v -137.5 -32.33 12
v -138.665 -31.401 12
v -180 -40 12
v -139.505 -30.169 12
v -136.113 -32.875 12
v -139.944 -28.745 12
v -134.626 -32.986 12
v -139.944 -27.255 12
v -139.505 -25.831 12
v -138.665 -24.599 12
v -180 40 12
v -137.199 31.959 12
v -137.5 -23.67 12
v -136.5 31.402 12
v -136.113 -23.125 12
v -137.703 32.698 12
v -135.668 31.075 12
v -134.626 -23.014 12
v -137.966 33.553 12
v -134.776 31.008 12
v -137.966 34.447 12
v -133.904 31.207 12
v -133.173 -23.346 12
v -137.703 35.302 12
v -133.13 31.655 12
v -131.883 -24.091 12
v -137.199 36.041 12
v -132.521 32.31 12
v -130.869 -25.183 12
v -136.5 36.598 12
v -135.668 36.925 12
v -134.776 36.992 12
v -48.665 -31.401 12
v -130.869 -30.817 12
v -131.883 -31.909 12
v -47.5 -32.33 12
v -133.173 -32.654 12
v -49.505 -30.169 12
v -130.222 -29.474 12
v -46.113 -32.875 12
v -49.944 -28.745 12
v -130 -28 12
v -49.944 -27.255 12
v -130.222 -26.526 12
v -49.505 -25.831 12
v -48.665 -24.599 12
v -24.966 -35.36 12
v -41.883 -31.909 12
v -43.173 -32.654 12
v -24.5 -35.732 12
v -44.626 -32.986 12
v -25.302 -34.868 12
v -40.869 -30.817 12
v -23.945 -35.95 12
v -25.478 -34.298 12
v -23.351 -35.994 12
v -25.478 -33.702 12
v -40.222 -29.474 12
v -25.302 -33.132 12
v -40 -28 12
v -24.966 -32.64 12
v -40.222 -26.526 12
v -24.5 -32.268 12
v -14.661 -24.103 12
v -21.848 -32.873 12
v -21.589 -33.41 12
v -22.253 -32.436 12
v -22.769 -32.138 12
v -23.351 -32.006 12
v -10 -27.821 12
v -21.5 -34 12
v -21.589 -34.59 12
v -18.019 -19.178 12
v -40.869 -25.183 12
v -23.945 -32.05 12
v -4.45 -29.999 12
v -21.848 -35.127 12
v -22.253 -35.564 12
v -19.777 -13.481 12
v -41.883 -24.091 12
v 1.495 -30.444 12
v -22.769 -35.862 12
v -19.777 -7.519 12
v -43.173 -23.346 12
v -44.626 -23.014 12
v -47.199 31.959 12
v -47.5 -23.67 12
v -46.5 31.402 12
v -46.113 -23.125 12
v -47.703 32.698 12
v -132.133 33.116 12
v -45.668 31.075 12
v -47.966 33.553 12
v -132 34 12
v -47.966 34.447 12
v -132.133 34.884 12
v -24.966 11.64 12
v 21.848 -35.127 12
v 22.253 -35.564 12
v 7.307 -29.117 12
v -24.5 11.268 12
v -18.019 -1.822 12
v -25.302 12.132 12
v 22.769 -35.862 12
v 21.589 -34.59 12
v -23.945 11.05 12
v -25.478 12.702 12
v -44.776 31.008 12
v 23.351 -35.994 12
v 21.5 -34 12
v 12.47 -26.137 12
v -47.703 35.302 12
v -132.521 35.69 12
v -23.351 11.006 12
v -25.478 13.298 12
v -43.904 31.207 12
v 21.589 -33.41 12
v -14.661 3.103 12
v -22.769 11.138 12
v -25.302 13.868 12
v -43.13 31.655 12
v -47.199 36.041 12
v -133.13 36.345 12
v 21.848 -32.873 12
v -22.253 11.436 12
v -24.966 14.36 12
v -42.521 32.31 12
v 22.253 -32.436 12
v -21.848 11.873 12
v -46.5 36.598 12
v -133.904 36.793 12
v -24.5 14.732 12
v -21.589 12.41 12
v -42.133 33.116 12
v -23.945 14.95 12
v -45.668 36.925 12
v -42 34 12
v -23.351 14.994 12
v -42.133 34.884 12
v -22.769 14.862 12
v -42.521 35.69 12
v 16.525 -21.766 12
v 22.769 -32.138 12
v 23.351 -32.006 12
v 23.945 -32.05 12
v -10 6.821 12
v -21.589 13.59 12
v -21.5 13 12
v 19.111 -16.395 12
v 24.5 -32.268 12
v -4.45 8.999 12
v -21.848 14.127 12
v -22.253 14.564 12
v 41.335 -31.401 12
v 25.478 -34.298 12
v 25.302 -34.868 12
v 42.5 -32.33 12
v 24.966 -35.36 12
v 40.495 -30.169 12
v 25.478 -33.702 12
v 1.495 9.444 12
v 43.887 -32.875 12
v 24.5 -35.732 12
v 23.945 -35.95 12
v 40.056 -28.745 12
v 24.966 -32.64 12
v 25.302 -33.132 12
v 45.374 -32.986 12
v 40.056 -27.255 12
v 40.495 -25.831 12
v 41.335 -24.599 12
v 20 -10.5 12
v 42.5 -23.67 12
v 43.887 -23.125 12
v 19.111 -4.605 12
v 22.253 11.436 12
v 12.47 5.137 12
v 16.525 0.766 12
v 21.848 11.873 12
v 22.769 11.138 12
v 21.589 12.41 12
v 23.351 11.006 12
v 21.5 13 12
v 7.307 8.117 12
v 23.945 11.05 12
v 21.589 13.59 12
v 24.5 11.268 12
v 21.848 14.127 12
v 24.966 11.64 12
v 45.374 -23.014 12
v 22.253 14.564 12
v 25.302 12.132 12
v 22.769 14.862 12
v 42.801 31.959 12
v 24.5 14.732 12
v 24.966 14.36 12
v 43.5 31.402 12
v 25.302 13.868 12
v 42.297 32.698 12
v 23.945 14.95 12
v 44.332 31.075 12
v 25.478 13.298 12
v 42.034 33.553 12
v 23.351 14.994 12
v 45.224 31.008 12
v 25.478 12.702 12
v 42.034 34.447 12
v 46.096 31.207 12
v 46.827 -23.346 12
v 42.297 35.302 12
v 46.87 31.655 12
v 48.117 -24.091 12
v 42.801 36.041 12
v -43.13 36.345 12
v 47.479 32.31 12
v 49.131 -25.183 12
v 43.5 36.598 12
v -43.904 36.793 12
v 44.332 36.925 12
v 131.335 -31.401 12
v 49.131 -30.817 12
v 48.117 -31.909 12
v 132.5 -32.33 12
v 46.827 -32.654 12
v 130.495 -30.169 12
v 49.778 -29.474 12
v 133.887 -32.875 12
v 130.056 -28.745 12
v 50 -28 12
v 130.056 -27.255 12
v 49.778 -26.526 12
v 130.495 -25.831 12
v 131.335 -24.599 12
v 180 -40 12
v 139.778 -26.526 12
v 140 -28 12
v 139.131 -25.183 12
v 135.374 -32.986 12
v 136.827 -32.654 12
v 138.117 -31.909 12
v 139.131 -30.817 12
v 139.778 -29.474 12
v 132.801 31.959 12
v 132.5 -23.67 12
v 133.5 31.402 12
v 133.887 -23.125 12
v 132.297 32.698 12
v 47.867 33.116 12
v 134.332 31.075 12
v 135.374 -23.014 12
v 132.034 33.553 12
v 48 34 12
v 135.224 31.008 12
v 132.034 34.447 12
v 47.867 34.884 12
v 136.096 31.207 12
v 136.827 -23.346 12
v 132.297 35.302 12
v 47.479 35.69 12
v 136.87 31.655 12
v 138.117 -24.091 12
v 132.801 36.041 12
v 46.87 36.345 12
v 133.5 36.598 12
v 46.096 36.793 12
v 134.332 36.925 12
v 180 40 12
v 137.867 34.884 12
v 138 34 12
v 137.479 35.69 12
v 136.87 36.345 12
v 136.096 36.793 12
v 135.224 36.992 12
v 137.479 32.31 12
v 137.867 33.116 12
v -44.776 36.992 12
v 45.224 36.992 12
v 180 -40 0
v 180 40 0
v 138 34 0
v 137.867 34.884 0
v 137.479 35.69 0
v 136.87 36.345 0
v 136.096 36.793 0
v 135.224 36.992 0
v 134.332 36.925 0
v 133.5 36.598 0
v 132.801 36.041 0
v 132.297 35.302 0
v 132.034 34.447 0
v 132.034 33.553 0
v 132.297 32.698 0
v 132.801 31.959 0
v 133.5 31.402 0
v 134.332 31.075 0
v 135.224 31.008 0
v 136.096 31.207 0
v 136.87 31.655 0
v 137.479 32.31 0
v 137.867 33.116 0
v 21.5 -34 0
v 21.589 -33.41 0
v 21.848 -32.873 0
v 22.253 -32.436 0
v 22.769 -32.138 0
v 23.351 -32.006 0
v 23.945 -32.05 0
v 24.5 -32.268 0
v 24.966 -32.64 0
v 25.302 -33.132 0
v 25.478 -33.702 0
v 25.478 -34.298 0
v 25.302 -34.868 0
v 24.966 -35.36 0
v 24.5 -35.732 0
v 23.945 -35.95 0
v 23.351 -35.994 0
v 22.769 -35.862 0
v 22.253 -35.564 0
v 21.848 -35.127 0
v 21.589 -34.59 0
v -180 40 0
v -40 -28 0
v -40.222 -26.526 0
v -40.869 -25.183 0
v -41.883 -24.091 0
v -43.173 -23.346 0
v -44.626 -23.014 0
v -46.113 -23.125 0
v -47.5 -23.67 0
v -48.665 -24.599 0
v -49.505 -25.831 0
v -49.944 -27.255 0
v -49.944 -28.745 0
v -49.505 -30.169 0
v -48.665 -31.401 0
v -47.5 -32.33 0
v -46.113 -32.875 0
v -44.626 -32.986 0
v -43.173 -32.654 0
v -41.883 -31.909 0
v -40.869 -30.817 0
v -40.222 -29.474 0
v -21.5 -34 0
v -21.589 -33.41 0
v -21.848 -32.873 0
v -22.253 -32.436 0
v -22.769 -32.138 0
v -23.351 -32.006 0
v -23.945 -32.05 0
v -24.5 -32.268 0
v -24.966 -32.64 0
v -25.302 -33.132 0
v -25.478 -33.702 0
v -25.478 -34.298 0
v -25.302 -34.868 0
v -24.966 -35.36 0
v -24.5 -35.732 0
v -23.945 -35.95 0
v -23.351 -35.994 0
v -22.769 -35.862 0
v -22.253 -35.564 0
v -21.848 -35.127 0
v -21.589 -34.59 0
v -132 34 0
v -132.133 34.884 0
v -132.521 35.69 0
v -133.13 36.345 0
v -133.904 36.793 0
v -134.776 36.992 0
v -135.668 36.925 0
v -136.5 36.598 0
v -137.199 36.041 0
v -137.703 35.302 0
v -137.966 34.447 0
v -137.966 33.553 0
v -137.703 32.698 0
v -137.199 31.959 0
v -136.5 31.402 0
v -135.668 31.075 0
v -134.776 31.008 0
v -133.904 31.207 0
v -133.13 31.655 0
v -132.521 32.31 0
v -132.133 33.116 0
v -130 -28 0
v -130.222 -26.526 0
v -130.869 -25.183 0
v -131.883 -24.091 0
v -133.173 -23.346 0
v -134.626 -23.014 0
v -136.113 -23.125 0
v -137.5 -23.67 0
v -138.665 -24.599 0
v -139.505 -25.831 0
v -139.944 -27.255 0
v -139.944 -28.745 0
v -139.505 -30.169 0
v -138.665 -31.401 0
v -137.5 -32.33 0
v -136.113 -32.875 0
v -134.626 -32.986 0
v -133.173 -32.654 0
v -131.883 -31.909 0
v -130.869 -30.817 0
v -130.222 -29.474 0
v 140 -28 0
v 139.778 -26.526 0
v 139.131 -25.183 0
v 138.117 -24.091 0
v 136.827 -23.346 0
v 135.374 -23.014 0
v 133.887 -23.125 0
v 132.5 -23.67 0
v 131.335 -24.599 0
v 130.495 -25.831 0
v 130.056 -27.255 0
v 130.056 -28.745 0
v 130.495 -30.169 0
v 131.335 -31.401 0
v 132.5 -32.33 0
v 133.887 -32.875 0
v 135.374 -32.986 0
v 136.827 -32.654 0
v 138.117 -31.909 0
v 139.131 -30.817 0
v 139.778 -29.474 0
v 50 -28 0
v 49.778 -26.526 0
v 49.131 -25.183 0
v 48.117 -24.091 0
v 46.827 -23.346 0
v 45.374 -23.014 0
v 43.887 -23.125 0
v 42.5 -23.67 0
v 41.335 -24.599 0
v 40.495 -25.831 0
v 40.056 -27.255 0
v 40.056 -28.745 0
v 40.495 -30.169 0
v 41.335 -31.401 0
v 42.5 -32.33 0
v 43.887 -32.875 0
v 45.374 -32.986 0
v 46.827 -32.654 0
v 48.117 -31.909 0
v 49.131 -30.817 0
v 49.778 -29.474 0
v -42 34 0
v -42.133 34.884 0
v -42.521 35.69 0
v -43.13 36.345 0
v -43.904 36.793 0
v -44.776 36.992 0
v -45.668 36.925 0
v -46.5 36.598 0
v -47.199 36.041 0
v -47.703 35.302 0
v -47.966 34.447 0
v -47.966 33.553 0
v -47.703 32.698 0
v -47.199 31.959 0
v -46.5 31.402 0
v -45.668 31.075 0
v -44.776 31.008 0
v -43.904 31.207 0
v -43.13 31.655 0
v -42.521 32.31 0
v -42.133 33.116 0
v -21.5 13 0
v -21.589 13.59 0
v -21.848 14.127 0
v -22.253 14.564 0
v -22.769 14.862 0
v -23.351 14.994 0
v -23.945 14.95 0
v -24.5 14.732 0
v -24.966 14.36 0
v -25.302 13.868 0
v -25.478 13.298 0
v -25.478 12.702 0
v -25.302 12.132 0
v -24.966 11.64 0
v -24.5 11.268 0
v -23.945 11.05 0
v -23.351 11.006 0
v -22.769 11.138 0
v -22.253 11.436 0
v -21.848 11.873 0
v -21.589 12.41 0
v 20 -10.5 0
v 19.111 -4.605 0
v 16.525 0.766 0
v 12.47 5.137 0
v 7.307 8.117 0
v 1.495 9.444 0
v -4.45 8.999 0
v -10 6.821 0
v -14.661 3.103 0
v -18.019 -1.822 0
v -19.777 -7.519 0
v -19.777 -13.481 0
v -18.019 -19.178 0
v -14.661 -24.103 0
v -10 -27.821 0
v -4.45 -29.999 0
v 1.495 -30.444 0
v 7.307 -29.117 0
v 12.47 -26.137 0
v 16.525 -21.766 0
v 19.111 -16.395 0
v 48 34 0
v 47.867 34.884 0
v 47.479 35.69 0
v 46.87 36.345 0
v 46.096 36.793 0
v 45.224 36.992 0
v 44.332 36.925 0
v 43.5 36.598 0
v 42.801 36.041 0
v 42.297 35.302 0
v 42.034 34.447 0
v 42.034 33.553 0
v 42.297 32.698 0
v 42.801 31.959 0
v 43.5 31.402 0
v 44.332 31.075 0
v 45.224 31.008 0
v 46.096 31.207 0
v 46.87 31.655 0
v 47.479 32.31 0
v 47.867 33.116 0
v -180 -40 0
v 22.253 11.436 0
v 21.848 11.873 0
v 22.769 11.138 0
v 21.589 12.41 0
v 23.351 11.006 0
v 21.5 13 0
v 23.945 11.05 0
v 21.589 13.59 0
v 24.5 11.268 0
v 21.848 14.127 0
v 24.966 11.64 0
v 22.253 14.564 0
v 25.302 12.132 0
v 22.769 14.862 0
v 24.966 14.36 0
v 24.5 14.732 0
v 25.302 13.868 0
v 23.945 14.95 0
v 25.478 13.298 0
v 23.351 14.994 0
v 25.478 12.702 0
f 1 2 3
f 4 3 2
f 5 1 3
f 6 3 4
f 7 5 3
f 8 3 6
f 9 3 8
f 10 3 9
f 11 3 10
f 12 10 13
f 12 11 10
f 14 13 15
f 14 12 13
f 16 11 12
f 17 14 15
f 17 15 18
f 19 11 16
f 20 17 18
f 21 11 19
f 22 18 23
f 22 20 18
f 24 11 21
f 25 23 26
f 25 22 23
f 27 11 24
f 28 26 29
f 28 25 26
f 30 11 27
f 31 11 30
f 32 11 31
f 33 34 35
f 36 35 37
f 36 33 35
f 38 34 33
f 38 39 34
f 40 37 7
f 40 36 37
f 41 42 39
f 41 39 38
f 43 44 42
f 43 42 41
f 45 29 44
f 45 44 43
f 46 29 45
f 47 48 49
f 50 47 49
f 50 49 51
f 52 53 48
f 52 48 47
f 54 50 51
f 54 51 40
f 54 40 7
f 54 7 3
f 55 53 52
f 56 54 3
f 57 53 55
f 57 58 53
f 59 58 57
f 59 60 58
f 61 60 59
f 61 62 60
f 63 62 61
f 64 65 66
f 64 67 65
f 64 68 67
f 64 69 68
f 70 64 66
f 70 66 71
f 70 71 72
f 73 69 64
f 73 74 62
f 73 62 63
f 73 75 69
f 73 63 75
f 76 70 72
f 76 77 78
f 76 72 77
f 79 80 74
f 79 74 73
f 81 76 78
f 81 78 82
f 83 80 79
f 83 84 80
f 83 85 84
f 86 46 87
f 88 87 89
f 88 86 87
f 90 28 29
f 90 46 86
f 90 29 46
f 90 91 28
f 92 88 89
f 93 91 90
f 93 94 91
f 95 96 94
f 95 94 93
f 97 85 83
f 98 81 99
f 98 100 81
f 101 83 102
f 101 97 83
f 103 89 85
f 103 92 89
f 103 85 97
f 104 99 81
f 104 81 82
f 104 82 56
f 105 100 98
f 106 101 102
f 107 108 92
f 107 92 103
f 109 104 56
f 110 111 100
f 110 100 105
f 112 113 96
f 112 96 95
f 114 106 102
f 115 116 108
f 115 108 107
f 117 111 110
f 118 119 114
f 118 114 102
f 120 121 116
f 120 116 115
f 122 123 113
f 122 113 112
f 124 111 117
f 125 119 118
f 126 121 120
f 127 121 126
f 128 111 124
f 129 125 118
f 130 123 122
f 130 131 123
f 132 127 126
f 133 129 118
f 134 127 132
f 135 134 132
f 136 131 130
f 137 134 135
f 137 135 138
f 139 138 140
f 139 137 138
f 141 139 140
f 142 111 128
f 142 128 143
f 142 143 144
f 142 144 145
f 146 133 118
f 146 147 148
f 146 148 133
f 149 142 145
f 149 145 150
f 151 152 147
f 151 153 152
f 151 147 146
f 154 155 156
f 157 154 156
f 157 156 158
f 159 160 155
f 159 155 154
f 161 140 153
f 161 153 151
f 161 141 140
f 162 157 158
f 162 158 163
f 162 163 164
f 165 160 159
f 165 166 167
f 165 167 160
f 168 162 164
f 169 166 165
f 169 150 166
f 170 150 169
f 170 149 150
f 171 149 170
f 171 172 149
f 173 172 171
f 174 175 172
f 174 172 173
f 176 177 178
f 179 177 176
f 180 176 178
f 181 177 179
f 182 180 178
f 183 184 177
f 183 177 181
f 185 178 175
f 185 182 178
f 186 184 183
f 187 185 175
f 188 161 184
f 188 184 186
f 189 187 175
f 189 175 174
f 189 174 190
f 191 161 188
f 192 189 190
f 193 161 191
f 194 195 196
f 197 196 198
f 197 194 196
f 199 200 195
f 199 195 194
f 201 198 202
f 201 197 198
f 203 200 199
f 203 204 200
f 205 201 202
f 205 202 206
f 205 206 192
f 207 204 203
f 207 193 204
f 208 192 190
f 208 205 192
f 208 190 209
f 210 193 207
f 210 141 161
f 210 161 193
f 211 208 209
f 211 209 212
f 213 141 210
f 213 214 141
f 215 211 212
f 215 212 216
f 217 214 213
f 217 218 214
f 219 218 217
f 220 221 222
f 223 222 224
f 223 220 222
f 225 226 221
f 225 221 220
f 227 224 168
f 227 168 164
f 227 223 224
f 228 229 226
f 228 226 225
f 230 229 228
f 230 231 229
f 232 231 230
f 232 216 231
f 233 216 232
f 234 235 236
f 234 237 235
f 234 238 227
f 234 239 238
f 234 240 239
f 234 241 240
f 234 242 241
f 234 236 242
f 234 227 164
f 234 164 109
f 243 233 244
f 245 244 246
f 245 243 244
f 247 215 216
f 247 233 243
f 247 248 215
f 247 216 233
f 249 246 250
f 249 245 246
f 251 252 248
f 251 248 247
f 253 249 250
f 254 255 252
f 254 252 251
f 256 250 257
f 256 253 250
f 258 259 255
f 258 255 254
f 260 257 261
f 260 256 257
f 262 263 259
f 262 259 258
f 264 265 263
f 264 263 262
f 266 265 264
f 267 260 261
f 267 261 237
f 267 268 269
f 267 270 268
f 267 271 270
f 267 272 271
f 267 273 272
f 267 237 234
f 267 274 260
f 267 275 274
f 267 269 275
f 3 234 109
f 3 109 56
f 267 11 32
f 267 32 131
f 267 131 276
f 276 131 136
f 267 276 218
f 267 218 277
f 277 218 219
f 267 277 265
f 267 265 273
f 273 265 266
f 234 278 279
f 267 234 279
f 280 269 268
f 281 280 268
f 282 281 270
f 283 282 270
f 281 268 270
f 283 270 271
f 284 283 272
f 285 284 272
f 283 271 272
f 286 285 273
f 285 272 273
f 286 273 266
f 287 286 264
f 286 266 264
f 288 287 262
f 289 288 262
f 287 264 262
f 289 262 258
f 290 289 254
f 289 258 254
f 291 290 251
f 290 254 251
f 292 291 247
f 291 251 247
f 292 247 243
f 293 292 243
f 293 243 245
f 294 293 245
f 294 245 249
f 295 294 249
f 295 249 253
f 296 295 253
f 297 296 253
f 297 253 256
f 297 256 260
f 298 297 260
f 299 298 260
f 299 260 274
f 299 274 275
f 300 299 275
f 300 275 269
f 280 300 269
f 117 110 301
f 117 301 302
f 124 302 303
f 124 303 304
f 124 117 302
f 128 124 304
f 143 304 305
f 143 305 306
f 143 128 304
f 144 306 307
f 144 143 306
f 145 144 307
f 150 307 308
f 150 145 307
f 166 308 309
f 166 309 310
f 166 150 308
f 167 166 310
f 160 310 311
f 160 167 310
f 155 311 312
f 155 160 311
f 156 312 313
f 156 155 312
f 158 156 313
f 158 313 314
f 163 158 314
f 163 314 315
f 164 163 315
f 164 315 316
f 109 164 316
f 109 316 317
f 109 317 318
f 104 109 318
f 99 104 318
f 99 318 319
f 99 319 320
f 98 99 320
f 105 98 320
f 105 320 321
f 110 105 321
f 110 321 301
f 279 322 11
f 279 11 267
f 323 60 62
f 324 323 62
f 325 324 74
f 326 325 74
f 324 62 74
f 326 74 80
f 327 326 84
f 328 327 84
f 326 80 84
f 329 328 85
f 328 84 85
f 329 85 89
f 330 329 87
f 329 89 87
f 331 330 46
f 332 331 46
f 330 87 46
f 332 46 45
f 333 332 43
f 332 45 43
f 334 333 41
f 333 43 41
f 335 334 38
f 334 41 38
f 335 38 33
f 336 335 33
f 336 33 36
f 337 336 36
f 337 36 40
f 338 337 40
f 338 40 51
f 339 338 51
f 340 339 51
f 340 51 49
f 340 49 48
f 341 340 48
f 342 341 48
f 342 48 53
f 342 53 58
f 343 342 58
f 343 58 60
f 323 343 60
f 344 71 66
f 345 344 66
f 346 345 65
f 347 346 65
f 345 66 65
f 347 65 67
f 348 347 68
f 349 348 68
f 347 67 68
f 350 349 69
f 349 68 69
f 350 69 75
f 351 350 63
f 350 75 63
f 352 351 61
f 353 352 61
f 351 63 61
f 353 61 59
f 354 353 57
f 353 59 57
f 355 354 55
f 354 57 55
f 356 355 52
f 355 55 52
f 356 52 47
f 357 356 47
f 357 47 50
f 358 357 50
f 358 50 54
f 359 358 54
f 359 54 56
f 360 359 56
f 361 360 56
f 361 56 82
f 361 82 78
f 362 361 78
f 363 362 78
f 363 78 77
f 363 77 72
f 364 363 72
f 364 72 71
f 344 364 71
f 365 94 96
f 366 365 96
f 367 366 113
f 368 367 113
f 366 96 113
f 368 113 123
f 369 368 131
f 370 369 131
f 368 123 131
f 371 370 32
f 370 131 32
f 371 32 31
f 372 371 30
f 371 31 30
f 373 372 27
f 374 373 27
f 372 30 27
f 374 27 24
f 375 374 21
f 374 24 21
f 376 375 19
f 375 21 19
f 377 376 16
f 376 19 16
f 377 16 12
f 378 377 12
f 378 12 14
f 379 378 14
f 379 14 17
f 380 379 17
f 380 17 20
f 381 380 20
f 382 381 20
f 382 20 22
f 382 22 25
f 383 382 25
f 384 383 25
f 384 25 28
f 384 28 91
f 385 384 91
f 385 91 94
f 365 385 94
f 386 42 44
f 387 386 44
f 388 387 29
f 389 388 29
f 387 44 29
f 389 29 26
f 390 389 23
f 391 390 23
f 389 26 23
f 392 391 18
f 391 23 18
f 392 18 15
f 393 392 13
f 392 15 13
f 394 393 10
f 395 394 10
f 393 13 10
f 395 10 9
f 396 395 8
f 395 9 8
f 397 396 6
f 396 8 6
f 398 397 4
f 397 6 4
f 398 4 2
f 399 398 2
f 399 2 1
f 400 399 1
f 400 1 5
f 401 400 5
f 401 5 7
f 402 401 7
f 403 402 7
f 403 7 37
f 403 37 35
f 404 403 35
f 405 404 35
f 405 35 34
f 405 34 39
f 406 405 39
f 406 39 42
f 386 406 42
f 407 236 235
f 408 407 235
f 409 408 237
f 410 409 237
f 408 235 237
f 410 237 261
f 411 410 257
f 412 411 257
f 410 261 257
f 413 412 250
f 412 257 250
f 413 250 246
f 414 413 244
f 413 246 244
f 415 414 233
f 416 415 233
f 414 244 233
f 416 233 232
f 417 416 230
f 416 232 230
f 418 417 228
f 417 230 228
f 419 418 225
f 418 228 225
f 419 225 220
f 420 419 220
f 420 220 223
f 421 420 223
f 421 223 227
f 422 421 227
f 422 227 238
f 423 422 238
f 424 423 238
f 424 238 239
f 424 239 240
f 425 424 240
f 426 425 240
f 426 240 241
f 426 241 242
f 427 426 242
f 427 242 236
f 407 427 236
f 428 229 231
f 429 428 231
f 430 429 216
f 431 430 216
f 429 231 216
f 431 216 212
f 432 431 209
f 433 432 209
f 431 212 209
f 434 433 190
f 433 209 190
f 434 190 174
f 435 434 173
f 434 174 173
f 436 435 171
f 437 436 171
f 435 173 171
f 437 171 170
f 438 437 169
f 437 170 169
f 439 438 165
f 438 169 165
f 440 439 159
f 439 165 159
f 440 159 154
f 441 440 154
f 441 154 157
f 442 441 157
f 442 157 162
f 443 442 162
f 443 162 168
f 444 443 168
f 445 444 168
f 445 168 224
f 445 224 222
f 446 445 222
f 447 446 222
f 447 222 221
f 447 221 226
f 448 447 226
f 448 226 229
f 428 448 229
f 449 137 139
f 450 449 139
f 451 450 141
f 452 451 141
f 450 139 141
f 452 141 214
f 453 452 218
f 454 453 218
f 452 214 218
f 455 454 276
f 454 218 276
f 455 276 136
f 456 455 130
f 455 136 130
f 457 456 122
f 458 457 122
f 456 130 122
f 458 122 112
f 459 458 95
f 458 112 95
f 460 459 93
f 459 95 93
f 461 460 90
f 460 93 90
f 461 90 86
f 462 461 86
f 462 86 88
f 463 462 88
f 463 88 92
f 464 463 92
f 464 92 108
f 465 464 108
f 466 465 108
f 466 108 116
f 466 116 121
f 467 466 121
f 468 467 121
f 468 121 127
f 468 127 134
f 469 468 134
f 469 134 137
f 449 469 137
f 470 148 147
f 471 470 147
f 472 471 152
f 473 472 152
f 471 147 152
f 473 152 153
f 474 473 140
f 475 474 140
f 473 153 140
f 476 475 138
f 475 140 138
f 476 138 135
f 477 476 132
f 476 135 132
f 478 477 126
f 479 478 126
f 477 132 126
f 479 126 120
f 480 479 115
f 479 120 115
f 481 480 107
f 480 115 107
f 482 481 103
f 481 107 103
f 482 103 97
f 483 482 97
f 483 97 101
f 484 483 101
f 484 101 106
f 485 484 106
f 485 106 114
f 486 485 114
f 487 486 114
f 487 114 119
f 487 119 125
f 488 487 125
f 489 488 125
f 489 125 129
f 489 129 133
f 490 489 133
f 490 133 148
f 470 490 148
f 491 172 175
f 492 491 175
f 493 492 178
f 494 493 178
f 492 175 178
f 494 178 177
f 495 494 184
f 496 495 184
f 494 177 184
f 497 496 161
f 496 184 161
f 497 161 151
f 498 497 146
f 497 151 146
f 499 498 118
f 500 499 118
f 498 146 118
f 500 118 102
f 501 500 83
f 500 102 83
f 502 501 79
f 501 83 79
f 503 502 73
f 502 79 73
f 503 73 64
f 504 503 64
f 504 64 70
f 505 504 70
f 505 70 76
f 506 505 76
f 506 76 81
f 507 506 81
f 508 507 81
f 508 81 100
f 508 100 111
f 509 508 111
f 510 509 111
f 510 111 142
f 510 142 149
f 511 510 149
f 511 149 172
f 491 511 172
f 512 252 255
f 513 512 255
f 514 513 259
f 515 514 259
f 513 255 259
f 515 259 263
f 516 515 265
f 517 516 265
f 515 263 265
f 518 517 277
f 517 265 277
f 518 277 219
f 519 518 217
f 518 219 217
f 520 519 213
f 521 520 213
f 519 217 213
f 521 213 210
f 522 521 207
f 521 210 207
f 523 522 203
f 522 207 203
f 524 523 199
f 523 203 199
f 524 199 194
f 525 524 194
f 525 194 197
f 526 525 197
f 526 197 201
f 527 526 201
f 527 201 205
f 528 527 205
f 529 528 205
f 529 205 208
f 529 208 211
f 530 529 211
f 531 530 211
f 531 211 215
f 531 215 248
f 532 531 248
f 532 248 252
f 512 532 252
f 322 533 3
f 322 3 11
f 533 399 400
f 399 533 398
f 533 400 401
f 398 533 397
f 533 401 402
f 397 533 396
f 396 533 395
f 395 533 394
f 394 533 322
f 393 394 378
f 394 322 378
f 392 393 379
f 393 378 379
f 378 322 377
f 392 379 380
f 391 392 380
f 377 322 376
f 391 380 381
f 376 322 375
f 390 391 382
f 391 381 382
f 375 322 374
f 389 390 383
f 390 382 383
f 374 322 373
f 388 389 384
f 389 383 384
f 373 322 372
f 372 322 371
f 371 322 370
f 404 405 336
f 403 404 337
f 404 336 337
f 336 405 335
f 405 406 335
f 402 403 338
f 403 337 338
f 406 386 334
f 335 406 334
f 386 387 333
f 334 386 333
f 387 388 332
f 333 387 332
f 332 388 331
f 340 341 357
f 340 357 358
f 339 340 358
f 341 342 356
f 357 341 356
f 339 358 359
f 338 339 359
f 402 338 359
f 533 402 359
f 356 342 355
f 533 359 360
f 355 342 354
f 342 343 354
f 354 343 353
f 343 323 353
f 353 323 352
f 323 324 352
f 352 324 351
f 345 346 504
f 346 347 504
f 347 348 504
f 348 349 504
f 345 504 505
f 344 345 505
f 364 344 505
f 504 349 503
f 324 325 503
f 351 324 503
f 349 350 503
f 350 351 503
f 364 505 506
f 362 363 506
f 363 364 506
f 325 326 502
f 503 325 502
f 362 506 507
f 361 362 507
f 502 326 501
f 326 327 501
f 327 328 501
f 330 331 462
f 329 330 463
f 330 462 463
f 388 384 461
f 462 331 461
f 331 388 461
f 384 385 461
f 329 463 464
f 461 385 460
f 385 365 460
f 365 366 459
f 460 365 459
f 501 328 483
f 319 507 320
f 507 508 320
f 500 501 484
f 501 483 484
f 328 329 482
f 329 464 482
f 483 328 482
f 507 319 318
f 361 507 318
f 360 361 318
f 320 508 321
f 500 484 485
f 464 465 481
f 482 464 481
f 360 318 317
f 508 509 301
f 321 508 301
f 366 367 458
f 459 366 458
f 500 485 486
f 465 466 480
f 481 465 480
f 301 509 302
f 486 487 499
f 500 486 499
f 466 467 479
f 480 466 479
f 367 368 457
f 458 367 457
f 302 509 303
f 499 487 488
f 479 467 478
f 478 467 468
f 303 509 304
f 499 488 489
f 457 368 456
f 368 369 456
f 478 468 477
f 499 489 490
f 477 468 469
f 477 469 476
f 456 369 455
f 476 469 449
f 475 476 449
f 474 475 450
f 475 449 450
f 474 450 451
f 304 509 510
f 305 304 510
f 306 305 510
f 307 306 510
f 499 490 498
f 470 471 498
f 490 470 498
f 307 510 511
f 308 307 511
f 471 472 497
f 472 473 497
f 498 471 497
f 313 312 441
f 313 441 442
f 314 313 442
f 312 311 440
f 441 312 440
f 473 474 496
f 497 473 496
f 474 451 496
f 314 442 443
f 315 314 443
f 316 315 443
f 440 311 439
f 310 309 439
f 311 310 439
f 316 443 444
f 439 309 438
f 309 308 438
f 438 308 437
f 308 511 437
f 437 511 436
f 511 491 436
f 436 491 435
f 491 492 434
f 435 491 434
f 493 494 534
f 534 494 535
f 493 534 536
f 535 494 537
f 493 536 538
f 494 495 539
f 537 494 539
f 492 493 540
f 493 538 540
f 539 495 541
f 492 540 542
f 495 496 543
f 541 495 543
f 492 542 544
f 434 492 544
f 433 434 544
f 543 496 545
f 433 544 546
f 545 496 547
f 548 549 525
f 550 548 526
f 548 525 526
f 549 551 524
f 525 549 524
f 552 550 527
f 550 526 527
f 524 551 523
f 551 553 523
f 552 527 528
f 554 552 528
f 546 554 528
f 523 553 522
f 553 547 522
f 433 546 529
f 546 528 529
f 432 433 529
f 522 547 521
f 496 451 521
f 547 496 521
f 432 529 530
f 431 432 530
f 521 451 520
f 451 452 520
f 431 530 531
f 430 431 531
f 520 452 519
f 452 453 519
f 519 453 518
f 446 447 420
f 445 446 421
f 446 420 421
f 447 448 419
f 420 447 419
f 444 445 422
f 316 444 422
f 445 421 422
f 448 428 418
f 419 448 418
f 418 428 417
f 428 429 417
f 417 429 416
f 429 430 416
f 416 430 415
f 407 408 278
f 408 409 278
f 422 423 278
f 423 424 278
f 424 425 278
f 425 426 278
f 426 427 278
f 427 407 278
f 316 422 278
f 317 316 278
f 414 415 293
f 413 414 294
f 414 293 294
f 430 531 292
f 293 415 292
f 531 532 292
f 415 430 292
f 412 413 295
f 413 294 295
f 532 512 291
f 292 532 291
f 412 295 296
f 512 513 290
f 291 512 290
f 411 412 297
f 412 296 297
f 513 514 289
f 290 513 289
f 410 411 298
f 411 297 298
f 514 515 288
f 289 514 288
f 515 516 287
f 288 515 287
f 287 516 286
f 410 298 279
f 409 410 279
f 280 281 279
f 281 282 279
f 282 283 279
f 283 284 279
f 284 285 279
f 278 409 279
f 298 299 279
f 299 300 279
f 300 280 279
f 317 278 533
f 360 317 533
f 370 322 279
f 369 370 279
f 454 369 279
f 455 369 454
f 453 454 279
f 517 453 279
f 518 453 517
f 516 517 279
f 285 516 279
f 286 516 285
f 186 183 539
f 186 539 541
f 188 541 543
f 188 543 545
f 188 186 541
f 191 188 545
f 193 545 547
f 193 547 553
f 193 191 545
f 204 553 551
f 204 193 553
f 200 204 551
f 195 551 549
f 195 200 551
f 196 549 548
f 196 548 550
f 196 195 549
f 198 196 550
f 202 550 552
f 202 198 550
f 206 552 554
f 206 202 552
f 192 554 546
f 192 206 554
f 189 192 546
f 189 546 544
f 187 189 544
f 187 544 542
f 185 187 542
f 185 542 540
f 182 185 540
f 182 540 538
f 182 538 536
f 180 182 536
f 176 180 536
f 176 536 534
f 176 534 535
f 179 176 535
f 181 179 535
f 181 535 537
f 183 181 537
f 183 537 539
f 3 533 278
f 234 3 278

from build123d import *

# Parameters (mm, degrees)
SKETCH1_W           = 360
SKETCH1_H           = 80
BOSS_EXTRUDE1_DEPTH = 12
CUT_EXTRUDE1_REACH  = 186.781
SKETCH2_R           = 3
SKETCH2_R_2         = 5
LPATTERN1_COUNT     = 4
LPATTERN1_PITCH     = 90
CUT_EXTRUDE2_REACH  = 186.781
SKETCH3_R           = 20
CUT_EXTRUDE3_REACH  = 186.781
SKETCH4_R           = 2


with BuildPart() as part:
    # Sketch1 → Boss-Extrude1 (new body)
    with BuildSketch(Plane.XY):
        Rectangle(SKETCH1_W, SKETCH1_H)
    extrude(amount=BOSS_EXTRUDE1_DEPTH)

    # Sketch2 → Cut-Extrude1 (cut, up to next)
    with BuildSketch(Plane.XY.offset(12), mode=Mode.PRIVATE) as cut_extrude1_sk1:
        with Locations((135, 34)):
            Circle(SKETCH2_R)
    cut_extrude1_tool1 = extrude(cut_extrude1_sk1.sketch, amount=-CUT_EXTRUDE1_REACH, mode=Mode.PRIVATE) & part.part
    # Sketch2 → Cut-Extrude1 (cut, up to next)
    with BuildSketch(Plane.XY.offset(12), mode=Mode.PRIVATE) as cut_extrude1_sk2:
        with Locations((135, -28)):
            Circle(SKETCH2_R_2)
    cut_extrude1_tool2 = extrude(cut_extrude1_sk2.sketch, amount=-CUT_EXTRUDE1_REACH, mode=Mode.PRIVATE) & part.part
    cut_extrude1_1 = cut_extrude1_tool1.solids().sort_by_distance((135, 34, 12))[0]
    add(cut_extrude1_1, mode=Mode.SUBTRACT)
    cut_extrude1_2 = cut_extrude1_tool2.solids().sort_by_distance((135, -28, 12))[0]
    add(cut_extrude1_2, mode=Mode.SUBTRACT)
    cut_extrude1 = cut_extrude1_1 + cut_extrude1_2  # Cut-Extrude1 as one shape, for the pattern or mirror that repeats it

    # LPattern1: Cut-Extrude1 ×4
    with Locations(*[(-i * LPATTERN1_PITCH, 0, 0) for i in range(1, LPATTERN1_COUNT)]):
        add(cut_extrude1, mode=Mode.SUBTRACT)

    # Sketch3 → Cut-Extrude2 (cut, up to next)
    with BuildSketch(Plane.XY.offset(12), mode=Mode.PRIVATE) as cut_extrude2_sk1:
        with Locations((0, -10.5)):
            Circle(SKETCH3_R)
    cut_extrude2_tool1 = extrude(cut_extrude2_sk1.sketch, amount=-CUT_EXTRUDE2_REACH, mode=Mode.PRIVATE) & part.part
    add(cut_extrude2_tool1.solids().sort_by_distance((0, -10.5, 12))[0], mode=Mode.SUBTRACT)

    # Sketch4 → Cut-Extrude3 (cut, up to next)
    with BuildSketch(Plane.XY.offset(12), mode=Mode.PRIVATE) as cut_extrude3_sk1:
        with Locations((-23.5, 13)):
            Circle(SKETCH4_R)
    cut_extrude3_tool1 = extrude(cut_extrude3_sk1.sketch, amount=-CUT_EXTRUDE3_REACH, mode=Mode.PRIVATE) & part.part
    # Sketch4 → Cut-Extrude3 (cut, up to next)
    with BuildSketch(Plane.XY.offset(12), mode=Mode.PRIVATE) as cut_extrude3_sk2:
        with Locations((-23.5, -34)):
            Circle(SKETCH4_R)
    cut_extrude3_tool2 = extrude(cut_extrude3_sk2.sketch, amount=-CUT_EXTRUDE3_REACH, mode=Mode.PRIVATE) & part.part
    cut_extrude3_1 = cut_extrude3_tool1.solids().sort_by_distance((-23.5, 13, 12))[0]
    add(cut_extrude3_1, mode=Mode.SUBTRACT)
    cut_extrude3_2 = cut_extrude3_tool2.solids().sort_by_distance((-23.5, -34, 12))[0]
    add(cut_extrude3_2, mode=Mode.SUBTRACT)
    cut_extrude3 = cut_extrude3_1 + cut_extrude3_2  # Cut-Extrude3 as one shape, for the pattern or mirror that repeats it

    # Mirror2: Cut-Extrude3 across plane
    add(cut_extrude3.mirror(Plane(origin=(0, 0, 0), x_dir=(0, 0, 1), z_dir=(1, 0, 0))), mode=Mode.SUBTRACT)


solid = part.part
